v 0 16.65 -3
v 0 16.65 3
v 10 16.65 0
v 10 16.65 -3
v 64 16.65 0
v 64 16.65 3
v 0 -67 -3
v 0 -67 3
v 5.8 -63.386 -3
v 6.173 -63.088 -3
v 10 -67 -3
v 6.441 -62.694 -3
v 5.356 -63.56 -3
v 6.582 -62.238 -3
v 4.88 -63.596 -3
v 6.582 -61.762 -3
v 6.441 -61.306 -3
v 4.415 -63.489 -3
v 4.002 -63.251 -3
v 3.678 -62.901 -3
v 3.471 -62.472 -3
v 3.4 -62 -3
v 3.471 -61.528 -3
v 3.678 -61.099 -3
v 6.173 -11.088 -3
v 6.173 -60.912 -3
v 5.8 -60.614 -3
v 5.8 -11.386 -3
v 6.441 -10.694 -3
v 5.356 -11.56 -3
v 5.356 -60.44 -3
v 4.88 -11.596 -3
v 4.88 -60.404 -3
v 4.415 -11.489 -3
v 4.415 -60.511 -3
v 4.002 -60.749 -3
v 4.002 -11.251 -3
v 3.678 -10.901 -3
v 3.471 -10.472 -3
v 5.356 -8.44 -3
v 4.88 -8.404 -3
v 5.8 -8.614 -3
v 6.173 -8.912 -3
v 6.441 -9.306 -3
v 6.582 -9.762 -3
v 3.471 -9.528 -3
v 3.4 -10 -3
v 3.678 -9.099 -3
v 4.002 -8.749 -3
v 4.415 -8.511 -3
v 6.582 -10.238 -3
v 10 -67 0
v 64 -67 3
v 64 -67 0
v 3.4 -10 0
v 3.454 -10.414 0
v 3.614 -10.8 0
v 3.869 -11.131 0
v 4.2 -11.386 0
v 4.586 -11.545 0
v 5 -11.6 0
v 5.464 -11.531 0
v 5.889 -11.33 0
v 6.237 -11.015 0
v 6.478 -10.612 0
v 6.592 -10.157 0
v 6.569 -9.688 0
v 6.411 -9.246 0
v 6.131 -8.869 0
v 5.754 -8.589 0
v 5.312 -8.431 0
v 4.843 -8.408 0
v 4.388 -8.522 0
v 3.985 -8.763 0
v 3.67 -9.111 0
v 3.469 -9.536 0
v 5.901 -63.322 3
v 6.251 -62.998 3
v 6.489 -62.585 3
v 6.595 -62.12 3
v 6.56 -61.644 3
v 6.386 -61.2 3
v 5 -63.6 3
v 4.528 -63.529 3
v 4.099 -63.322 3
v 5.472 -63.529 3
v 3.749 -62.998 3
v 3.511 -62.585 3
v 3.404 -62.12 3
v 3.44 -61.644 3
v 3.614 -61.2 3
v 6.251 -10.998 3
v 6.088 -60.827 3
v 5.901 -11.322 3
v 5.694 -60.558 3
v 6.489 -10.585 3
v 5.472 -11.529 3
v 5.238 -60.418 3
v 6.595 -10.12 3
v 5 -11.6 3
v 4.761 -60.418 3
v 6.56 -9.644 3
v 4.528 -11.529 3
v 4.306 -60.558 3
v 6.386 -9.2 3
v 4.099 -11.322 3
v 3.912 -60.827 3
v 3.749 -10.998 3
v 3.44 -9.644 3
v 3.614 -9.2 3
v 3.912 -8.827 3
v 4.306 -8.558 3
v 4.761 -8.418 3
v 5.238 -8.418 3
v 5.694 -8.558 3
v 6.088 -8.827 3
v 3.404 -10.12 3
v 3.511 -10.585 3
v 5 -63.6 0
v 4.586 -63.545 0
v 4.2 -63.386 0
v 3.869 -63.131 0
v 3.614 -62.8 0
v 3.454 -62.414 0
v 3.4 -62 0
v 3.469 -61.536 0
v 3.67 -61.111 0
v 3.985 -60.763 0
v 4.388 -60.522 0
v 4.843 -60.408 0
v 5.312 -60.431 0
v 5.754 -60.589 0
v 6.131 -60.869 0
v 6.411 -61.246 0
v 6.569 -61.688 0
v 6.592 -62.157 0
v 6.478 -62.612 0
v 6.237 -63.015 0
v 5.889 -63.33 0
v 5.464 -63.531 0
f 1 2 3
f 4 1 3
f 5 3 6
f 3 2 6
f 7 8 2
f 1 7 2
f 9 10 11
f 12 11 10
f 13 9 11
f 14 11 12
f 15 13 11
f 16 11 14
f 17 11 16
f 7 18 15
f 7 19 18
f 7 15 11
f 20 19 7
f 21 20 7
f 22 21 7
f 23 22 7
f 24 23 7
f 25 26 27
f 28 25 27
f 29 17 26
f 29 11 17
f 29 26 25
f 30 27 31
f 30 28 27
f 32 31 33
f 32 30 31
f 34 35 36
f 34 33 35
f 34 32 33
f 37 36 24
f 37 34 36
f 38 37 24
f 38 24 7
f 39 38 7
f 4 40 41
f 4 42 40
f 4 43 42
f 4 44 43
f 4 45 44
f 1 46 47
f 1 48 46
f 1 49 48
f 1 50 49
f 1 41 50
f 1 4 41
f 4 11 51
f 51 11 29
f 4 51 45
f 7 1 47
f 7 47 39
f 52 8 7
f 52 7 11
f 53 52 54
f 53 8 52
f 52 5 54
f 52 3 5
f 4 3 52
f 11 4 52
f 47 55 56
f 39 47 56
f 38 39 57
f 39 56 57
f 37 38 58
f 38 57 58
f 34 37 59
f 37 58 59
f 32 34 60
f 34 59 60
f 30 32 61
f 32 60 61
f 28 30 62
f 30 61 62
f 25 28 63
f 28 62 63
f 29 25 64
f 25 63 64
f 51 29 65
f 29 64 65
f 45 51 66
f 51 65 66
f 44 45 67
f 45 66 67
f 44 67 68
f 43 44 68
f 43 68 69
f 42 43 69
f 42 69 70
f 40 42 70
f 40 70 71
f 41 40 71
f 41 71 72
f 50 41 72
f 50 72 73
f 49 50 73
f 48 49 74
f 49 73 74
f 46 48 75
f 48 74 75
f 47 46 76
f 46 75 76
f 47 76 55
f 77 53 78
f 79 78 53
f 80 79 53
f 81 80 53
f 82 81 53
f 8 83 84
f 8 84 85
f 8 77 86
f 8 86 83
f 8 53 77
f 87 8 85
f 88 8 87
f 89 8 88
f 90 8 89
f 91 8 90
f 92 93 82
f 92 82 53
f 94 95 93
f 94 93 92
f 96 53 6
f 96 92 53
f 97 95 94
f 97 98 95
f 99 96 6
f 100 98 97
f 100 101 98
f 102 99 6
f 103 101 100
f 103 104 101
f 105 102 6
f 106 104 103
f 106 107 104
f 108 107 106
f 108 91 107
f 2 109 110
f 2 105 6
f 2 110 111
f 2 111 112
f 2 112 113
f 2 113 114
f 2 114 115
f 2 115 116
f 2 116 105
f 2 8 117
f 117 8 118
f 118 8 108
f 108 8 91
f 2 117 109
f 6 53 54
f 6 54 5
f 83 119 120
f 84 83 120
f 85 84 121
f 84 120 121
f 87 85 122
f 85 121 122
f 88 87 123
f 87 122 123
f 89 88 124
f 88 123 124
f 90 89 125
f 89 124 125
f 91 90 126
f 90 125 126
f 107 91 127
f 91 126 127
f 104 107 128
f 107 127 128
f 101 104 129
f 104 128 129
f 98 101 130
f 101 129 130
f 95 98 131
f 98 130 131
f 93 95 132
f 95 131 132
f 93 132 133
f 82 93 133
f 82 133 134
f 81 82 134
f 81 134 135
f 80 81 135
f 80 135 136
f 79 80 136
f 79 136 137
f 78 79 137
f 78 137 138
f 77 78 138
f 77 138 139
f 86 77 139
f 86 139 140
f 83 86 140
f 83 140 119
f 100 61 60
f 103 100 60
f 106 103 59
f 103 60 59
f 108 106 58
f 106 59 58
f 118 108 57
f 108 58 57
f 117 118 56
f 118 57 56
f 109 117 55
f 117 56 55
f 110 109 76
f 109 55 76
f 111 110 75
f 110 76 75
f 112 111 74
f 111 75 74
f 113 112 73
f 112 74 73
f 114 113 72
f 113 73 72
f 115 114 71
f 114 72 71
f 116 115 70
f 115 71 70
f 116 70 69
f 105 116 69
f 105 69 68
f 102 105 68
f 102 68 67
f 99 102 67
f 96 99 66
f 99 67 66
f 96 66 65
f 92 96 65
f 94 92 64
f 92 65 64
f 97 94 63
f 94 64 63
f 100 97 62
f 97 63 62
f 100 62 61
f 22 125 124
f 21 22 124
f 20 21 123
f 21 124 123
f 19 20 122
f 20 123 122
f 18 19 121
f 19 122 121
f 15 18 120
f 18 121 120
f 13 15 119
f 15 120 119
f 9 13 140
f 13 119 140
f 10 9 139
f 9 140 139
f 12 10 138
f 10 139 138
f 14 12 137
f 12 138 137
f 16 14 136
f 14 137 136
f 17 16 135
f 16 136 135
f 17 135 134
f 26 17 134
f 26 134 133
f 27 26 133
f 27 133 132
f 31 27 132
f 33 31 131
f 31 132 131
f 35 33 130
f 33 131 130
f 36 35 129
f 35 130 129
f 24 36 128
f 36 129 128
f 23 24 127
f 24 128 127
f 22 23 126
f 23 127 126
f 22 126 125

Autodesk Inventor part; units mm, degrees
ref_plane "YZ Plane" through (0, 0, 0) normal (1, 0, 0) x (0, 1, 0)
ref_plane "Plano de trabajo7" through (63.9999, 14.8405, -83) normal (1, 0, 0) x (0, 1, 0)
sketch "Boceto2" plane through (0, 0, 0) normal (1, 0, 0) x (0, 1, 0)
  line L0 (0, 0) -> (-67, 0)
  line L1 (-67, 0) -> (-67, 3)
  line L2 (-67, 3) -> (0, 3)
  line L3 (0, 3) -> (0, 0)
  line L4 (16.65, -80) -> (16.65, 9) projected
  line L5 (0, 3) -> (16.65, 3)
  line L6 (16.65, 3) -> (16.65, 0)
  line L7 (16.65, 0) -> (0, 0)
  line L8 (0, 0) -> (0, 3)
  dimension "d2" = 67
  dimension "d3" = 3
extrude "Extrusión2" add sketch "Boceto2" along normal up to surface (63.9999 mm away)
sketch "Boceto8" plane through (0, -67, 3) normal (0, 0, 1) x (1, 0, 0)
  circle A0 centre (4.9999, 5) radius 2.1 projected
  circle A1 centre (4.9999, 57) radius 2.1 projected
  line L0 (-2.0001, 83.65) -> (-2.0001, 76.5) projected
  line L1 (-2.0001, 76.5) -> (-20.0001, 76.5) projected
  line L2 (-20.0001, 76.5) -> (-20.0001, 0) projected
  line L3 (9.9999, 0) -> (-20.0001, 0) projected
  line L4 (9.9999, 0) -> (9.9999, 83.65) projected
  line L5 (9.9999, 83.65) -> (-2.0001, 83.65) projected
  circle A2 centre (4.9999, 57) radius 1.6
  circle A3 centre (4.9999, 5) radius 1.6
  point P0 (0, 67)
  dimension "d31" = 3.2
  dimension "d32" = 3.2
hole "Agujero3" at (4.9999, -10, 3) at (4.9999, -62, 3) direction (0, 0, -1) diameter 3.2 depth 5
sketch "Boceto9" plane through (0, -67, 0) normal (0, 0, -1) x (-1, 0, 0)
  line L0 (-9.9999, 83.65) -> (-9.9999, 0) projected
  line L1 (-63.9999, 0) -> (-9.9999, 0) projected
  circle A0 centre (-4.9999, 5) radius 1.6 projected
  circle A1 centre (-4.9999, 57) radius 1.6 projected
  line L2 (0, 0) -> (0, 83.65) projected
  line L3 (0, 83.65) -> (-63.9999, 83.65) projected
  line L4 (0, 0) -> (-63.9999, 0) projected
  line L5 (-63.9999, 83.65) -> (-63.9999, 0) projected
  line L6 (-9.9999, 83.65) -> (-32.9722, 83.65) projected
  line L7 (-40.0761, 83.65) -> (-63.9999, 83.65) projected
  line L8 (-32.9722, 83.65) -> (-29.7863, 64.5577) projected
  line L9 (-34.4654, 63.5184) -> (-40.0761, 83.65) projected
  arc A2 (-34.4654, 63.5184) -> (-29.7863, 64.5577) centre (-32.1535, 64.1627) ccw projected
  line L10 (-63.9999, 83.65) -> (-63.9999, 0) projected
  point P0 (0, 67)
  point P1 (-63.9999, 0)
  point P2 (-37.9999, 83.65)
extrude "Extrusión6" add sketch "Boceto9" along normal blind 3 contours L3 L2 L4 L0
sketch "Boceto10" plane through (65, -67, 0) normal (0, 0, -1) x (-1, 0, 0)
  line L0 (24.0001, 83.65) -> (24.0001, 86.65) projected
  line L1 (24.0001, 83.65) -> (27.0001, 83.65)
  line L2 (65, 83.65) -> (1.0001, 83.65) projected
  line L3 (35.8799, 60.5564) -> (35.8799, 64.1631) projected
  line L4 (35.8799, 60.4) -> (35.8799, 60.5564) projected
  line L5 (35.8799, 60.4) -> (33.8799, 60.4)
  line L6 (27.0001, 83.65) -> (30.0001, 83.65)
  line L7 (30.0001, 83.65) -> (33.8799, 60.4)
  line L8 (33.8799, 60.4) -> (33.4799, 60.4)
  line L9 (33.4799, 60.4) -> (27.0001, 83.65)
  point P0 (65, 67)
  point P1 (0, 83.65)
  dimension "d42" = 3
  dimension "d43" = 2
  dimension "d44" = 3
  dimension "d48" = 0.4
ref_plane "Plano de trabajo6" through (9.9999, -67, -72) normal (0, 0, 1) x (1, 0, 0)
extrude "Extrusión7" [suppressed]
fillet "Empalme1" [suppressed]
fillet "Empalme2" [suppressed]
properties part number "Lateral derecho"
